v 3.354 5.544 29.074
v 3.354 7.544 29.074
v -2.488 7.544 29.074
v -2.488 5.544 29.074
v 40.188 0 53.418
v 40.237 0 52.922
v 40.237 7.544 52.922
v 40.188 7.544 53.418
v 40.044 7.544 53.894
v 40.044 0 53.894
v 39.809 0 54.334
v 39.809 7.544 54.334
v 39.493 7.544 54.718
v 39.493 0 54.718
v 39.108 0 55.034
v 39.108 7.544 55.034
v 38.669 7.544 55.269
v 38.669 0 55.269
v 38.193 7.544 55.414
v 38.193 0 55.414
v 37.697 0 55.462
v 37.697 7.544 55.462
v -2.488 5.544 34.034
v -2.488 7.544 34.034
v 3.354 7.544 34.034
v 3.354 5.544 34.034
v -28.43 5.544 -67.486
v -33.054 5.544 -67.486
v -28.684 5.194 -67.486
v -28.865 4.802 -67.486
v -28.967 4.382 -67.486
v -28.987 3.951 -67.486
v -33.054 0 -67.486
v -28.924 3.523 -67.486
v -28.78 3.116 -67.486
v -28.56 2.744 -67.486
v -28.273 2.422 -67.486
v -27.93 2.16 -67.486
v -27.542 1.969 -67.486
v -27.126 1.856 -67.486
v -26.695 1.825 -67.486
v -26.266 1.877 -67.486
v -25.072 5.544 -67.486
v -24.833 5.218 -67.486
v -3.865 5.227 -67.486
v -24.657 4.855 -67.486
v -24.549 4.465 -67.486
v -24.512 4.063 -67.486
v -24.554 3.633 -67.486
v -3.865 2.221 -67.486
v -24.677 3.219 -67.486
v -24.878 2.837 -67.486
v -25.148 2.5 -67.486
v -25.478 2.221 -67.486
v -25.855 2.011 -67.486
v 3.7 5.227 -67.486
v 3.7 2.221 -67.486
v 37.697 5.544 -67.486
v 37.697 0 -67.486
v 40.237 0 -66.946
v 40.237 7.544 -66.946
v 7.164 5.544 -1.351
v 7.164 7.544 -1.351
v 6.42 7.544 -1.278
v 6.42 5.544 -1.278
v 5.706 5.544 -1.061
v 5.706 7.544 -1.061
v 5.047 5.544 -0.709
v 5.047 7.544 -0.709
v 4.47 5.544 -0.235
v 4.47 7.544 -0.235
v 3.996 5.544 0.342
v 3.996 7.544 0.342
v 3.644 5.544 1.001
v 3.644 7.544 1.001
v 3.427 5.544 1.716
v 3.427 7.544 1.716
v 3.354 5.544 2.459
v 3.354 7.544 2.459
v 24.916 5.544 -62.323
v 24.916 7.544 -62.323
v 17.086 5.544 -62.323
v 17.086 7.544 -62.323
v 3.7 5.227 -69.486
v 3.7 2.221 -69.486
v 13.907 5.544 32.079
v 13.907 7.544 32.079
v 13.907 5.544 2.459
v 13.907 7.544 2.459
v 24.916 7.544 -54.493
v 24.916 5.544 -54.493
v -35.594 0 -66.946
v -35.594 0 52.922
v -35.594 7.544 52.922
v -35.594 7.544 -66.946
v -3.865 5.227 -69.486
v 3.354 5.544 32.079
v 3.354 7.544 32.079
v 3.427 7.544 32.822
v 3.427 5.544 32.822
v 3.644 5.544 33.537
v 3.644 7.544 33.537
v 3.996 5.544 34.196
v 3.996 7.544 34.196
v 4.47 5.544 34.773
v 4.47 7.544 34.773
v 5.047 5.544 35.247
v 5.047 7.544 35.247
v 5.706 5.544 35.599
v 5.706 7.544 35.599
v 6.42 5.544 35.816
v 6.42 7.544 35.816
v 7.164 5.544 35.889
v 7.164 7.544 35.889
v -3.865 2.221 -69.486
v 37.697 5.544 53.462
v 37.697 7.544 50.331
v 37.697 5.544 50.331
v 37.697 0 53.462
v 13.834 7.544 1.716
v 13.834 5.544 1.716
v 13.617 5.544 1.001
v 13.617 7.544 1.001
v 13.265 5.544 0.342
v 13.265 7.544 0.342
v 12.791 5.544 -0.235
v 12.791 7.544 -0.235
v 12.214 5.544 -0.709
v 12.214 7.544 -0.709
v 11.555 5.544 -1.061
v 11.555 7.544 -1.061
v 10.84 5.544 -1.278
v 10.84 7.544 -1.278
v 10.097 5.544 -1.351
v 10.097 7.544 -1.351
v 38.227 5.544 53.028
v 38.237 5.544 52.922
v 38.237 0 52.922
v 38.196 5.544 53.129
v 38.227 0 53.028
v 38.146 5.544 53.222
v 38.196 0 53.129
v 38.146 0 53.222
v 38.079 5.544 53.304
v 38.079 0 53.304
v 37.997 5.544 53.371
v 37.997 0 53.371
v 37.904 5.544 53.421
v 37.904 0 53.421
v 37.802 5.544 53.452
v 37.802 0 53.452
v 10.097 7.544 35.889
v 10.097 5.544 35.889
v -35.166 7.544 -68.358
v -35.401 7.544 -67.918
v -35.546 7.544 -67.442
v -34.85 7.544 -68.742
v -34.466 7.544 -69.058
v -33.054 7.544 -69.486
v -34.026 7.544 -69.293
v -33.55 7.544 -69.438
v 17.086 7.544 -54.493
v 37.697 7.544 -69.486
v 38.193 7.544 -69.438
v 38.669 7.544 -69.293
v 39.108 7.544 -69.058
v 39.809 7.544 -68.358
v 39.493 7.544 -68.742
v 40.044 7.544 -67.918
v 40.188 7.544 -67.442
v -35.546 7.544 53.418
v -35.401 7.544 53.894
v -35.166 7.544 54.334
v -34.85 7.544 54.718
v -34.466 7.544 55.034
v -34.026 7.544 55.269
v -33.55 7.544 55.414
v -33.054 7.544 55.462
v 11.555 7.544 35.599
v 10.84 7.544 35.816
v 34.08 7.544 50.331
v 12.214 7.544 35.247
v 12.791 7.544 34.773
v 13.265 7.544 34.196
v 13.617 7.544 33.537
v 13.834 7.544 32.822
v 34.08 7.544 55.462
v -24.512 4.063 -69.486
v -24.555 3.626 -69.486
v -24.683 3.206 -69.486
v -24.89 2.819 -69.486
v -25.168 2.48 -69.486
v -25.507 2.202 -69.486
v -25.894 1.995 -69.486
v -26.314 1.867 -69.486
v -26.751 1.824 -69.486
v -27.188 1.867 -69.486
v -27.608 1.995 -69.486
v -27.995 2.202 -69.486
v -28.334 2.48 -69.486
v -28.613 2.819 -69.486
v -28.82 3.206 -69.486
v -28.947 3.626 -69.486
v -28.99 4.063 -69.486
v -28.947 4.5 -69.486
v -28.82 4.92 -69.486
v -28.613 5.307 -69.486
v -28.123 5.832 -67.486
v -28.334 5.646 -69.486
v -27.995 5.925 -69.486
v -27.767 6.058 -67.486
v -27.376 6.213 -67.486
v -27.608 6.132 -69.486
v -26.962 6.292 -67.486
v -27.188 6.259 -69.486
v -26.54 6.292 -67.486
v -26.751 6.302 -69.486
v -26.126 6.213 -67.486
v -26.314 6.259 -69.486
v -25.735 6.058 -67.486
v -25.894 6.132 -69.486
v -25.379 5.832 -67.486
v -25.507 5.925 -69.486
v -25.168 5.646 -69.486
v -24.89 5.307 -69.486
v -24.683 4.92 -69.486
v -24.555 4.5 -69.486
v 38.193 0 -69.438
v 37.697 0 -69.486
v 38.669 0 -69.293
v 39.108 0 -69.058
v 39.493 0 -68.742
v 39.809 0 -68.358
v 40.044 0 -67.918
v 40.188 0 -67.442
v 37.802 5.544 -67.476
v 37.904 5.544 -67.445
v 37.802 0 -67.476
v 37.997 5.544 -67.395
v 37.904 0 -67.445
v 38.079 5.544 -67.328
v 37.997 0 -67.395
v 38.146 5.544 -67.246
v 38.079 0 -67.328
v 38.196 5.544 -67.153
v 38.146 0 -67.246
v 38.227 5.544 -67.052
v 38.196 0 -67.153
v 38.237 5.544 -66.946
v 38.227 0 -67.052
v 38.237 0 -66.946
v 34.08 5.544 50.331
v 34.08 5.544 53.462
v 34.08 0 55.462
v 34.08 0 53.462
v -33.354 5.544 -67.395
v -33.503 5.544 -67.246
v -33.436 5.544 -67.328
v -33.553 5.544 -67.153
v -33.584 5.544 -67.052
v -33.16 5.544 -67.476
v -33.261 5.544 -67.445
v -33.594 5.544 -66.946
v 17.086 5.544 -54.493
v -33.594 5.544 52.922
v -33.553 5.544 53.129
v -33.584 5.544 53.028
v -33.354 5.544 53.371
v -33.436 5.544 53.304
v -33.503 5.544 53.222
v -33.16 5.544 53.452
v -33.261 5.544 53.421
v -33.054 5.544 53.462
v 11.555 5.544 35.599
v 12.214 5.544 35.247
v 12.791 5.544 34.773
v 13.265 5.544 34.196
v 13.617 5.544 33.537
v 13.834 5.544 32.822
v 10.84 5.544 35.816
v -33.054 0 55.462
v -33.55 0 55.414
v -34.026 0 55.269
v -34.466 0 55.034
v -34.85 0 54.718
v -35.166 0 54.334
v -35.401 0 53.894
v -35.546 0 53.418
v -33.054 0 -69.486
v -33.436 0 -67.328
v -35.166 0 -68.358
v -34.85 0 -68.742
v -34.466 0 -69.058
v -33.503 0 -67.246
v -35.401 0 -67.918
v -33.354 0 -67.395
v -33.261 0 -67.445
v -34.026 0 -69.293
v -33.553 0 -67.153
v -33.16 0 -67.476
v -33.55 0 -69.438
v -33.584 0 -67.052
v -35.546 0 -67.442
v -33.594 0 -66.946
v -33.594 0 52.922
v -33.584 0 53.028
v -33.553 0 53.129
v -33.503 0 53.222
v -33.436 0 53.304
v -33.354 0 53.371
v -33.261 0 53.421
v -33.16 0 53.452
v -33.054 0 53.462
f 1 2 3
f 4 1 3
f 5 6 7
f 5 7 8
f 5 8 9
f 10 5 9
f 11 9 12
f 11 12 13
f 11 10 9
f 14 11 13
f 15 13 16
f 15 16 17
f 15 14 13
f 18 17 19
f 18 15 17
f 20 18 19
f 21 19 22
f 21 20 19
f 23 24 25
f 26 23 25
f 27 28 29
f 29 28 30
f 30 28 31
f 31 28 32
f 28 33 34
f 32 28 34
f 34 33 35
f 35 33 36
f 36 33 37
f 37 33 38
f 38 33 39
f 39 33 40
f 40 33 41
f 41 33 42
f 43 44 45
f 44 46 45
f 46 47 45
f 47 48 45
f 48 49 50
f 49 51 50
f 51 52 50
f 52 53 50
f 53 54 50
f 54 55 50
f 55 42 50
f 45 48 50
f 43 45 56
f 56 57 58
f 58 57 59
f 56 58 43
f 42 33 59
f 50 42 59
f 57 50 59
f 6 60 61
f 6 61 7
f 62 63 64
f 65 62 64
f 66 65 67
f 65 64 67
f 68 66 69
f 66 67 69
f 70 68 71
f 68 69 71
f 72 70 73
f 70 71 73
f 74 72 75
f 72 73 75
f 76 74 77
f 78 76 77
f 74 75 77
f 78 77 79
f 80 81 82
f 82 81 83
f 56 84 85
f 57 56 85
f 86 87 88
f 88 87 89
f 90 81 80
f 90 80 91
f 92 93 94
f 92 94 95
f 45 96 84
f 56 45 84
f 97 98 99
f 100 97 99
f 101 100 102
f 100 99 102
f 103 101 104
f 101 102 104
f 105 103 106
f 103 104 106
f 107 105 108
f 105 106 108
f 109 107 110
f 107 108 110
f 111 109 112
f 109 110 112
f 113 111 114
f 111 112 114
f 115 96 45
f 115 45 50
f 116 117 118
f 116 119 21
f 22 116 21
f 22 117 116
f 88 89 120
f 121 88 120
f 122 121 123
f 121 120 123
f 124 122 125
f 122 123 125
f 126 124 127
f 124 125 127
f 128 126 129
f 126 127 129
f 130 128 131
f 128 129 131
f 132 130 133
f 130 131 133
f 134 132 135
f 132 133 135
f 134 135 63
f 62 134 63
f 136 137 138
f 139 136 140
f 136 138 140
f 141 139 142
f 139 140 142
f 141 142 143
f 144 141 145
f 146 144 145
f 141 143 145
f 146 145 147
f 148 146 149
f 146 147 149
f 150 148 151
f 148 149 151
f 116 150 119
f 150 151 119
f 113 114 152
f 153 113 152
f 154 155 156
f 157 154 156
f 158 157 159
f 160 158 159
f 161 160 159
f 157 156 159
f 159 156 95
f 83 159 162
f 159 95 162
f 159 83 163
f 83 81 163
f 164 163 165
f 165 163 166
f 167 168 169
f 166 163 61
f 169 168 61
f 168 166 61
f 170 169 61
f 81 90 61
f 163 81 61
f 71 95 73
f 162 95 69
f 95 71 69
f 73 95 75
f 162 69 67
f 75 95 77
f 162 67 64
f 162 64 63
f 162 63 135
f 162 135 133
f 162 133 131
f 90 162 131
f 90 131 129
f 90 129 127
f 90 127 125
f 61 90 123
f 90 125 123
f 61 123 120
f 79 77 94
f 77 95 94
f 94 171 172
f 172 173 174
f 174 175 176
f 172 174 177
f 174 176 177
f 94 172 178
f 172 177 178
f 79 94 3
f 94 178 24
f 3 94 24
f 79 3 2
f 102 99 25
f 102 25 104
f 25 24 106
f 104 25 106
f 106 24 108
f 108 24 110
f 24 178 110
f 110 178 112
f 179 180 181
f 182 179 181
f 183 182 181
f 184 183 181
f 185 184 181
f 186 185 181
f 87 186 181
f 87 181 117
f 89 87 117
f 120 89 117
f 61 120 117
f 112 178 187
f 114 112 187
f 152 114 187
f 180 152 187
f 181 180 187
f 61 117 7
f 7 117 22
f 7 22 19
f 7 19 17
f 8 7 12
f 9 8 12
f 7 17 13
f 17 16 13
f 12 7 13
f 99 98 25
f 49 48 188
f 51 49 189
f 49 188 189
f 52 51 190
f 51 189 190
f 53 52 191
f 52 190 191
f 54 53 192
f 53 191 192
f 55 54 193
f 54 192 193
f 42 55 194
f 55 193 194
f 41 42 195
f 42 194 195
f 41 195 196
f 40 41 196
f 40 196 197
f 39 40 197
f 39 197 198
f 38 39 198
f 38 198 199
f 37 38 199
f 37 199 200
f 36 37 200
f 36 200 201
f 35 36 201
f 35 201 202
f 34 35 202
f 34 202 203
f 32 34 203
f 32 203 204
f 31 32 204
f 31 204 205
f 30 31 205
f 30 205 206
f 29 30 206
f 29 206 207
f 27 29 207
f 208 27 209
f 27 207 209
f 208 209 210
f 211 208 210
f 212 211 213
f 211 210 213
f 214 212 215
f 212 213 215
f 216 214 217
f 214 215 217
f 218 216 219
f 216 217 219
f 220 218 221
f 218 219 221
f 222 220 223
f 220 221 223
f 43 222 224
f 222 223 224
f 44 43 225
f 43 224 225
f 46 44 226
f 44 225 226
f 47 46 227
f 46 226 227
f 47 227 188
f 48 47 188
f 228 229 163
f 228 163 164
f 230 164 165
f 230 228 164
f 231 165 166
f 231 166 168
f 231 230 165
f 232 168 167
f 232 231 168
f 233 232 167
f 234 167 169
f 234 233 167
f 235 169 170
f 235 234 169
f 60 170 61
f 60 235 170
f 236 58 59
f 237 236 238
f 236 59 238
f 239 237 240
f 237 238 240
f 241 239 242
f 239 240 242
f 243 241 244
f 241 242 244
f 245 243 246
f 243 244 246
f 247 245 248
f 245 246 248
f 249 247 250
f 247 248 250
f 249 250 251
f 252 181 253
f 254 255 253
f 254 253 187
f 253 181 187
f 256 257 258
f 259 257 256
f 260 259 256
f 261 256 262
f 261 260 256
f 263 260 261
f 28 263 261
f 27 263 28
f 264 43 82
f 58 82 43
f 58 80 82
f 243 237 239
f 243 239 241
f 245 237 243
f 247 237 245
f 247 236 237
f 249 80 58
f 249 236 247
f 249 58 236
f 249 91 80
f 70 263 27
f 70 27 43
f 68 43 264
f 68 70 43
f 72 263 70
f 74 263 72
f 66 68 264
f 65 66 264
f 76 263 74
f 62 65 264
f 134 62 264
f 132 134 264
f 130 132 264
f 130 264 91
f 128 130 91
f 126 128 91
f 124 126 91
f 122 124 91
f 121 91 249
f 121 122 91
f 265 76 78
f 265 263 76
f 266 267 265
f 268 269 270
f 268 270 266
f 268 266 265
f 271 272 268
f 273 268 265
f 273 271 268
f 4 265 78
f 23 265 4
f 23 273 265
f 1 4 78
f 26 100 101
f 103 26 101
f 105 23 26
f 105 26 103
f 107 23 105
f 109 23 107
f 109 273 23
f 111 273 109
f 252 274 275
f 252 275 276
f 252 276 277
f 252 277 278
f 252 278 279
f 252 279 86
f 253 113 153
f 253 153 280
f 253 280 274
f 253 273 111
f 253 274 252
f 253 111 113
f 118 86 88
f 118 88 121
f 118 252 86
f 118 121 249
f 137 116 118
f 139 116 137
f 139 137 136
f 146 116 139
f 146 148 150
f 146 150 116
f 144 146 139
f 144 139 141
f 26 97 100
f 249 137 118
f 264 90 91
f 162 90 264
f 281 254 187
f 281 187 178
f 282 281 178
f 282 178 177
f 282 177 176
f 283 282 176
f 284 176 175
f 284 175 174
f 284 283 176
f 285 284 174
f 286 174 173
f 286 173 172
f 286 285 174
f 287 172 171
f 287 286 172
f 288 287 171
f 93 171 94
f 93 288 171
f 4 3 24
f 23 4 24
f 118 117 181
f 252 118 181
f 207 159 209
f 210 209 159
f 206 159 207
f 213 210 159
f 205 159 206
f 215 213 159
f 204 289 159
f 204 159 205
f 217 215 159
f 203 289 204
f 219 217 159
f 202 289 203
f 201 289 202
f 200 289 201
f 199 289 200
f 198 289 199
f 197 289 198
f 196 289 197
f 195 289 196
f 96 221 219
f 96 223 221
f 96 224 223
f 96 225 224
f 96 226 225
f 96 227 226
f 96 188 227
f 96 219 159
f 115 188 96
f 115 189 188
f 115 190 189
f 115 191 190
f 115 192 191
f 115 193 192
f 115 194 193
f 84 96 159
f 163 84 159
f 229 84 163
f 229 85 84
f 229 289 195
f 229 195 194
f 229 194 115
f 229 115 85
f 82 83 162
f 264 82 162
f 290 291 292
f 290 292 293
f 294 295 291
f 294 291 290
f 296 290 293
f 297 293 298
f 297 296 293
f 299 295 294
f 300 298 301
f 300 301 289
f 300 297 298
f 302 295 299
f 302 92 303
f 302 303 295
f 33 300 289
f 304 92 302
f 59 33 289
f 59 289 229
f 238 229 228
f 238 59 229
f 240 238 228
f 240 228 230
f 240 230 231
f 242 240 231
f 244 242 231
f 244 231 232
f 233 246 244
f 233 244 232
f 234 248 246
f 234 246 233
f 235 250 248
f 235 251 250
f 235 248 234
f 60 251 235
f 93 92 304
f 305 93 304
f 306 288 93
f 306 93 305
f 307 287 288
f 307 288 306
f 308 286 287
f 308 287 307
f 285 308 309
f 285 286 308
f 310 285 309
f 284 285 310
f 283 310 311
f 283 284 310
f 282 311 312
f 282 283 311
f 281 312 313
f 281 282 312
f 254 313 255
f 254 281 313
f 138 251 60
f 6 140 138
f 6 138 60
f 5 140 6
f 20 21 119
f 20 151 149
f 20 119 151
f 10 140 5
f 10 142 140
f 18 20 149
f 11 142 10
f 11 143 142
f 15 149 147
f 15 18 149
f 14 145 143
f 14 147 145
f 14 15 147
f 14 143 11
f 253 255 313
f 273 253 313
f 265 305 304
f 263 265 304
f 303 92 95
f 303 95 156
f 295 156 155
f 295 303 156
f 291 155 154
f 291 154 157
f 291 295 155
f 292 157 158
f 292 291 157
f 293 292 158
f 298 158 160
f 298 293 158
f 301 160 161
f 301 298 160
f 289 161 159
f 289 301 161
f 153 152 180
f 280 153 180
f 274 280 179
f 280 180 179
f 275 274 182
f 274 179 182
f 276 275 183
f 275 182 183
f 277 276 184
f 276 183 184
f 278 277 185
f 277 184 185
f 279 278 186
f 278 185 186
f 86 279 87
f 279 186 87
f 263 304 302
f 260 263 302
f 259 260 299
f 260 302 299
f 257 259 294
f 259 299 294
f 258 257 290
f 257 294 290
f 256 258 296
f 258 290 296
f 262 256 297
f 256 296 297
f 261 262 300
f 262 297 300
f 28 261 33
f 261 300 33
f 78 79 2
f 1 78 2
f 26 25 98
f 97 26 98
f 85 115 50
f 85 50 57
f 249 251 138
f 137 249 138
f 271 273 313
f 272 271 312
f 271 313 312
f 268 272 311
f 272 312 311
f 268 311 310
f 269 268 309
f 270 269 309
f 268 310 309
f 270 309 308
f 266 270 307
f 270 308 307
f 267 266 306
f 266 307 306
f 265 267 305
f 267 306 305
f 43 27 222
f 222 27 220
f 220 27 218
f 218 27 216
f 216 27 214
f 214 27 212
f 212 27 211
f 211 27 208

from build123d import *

# Parameters (mm, degrees)
F1_DEPTH = 7.5438
F4_T     = -2
F3_W     = 7.7331361671
F3_H     = 7.36
F3_W_2   = 3.617387048
F3_H_2   = 5.1309723878
F3_W_3   = 7.83
F3_H_3   = 7.83
F5_DEPTH = 50.8
F6_DEPTH = 25.4
F7_DEPTH = 50.8
F2_R     = 2.2388813648
F2_W     = 7.5641849544
F2_H     = 3.0062778387
F8_DEPTH = 2


with BuildPart() as f1:
    # F0 (on Front) → F1 (new body)
    with BuildSketch(Plane.XZ):
        with BuildLine():
            Line((37.6971361852, 55.4623973095), (-33.0543925679, 55.4623973095))
            ThreePointArc((-33.0543925679, 55.4623973095), (-34.8504437921, 54.7184485338), (-35.5943925679, 52.9223973095))
            Line((-35.5943925679, 52.9223973095), (-35.5943925679, -66.9464466786))
            ThreePointArc((-35.5943925679, -66.9464466786), (-34.8504437921, -68.7424979029), (-33.0543925679, -69.4864466786))
            Line((-33.0543925679, -69.4864466786), (37.6971361852, -69.4864466786))
            ThreePointArc((37.6971361852, -69.4864466786), (39.4931874094, -68.7424979029), (40.2371361852, -66.9464466786))
            Line((40.2371361852, -66.9464466786), (40.2371361852, 52.9223973095))
            ThreePointArc((40.2371361852, 52.9223973095), (39.4931874094, 54.7184485338), (37.6971361852, 55.4623973095))
        make_face()
    extrude(amount=-F1_DEPTH)

    # F4
    f4_openings = [f1.faces().sort_by_distance(p)[0] for p in [
        (2.321372, 0, -7.012025),
    ]]
    offset(amount=F4_T, openings=f4_openings)

    # F3 (on face) → F5 (cut)
    with BuildSketch(Plane(origin=(0, 7.5438, 0), x_dir=(-1, 0, 0), z_dir=(0, 1, 0))):
        with BuildLine():
            Line((-7.1636471725, 35.889052581), (-10.0967833396, 35.889052581))
            ThreePointArc((-10.0967833396, 35.889052581), (-12.7908601759, 34.7731294173), (-13.9067833396, 32.079052581))
            Line((-13.9067833396, 32.079052581), (-13.9067833396, 22.249052581))
            Line((-13.9067833396, 22.249052581), (-3.3536471725, 22.249052581))
            Line((-3.3536471725, 22.249052581), (-3.3536471725, 29.0738900152))
            Line((-3.3536471725, 29.0738900152), (-3.3536471725, 32.079052581))
            ThreePointArc((-3.3536471725, 32.079052581), (-4.4695703362, 34.7731294173), (-7.1636471725, 35.889052581))
        make_face()
        Polygon((-3.3536471725, 34.0338900152), (-3.3536471725, 32.079052581), (-3.3536471725, 29.0738900152), (2.4879228336, 29.0738900152), (2.4879228336, 34.0338900152), align=None)
        with BuildLine():
            Line((-3.3536471725, 22.249052581), (-13.9067833396, 22.249052581))
            Line((-13.9067833396, 22.249052581), (-13.9067833396, 2.459052581))
            ThreePointArc((-13.9067833396, 2.459052581), (-12.7908601759, -0.2350242554), (-10.0967833396, -1.350947419))
            Line((-10.0967833396, -1.350947419), (-7.1636471725, -1.350947419))
            ThreePointArc((-7.1636471725, -1.350947419), (-4.4695703362, -0.2350242554), (-3.3536471725, 2.459052581))
            Line((-3.3536471725, 2.459052581), (-3.3536471725, 22.249052581))
        make_face()
        with Locations((-8.630215256, 10.449052581)):
            Rectangle(F3_W, F3_H, mode=Mode.SUBTRACT)
        with Locations((-35.8884426612, 52.8969111156)):
            Rectangle(F3_W_2, F3_H_2)
        with Locations((-21.0011794782, -58.4082461512)):
            Rectangle(F3_W_3, F3_H_3)
    extrude(amount=-F5_DEPTH, mode=Mode.SUBTRACT)

    # F6 (add): a face of the model
    f6_faces = [f1.faces().sort_by_distance(p)[0] for p in [
        (8.630215256, 7.5438, 10.449052581),
    ]]
    extrude(f6_faces, amount=F6_DEPTH)

    # F7 (cut): a face of the model
    f7_faces = [f1.faces().sort_by_distance(p)[0] for p in [
        (8.630215256, 32.9438, 10.449052581),
    ]]
    extrude(f7_faces, amount=-F7_DEPTH, mode=Mode.SUBTRACT)

    # F2 (on face) → F8 (cut)
    with BuildSketch(Plane(origin=(0, 0, -69.4864466786), x_dir=(1, 0, 0), z_dir=(0, 0, -1))):
        with Locations((-26.7510712147, -4.0631839074)):
            Circle(F2_R)
        with Locations((-0.0824703602, -3.7237651413)):
            Rectangle(F2_W, F2_H)
    extrude(amount=-F8_DEPTH, mode=Mode.SUBTRACT)


solid = f1.part
